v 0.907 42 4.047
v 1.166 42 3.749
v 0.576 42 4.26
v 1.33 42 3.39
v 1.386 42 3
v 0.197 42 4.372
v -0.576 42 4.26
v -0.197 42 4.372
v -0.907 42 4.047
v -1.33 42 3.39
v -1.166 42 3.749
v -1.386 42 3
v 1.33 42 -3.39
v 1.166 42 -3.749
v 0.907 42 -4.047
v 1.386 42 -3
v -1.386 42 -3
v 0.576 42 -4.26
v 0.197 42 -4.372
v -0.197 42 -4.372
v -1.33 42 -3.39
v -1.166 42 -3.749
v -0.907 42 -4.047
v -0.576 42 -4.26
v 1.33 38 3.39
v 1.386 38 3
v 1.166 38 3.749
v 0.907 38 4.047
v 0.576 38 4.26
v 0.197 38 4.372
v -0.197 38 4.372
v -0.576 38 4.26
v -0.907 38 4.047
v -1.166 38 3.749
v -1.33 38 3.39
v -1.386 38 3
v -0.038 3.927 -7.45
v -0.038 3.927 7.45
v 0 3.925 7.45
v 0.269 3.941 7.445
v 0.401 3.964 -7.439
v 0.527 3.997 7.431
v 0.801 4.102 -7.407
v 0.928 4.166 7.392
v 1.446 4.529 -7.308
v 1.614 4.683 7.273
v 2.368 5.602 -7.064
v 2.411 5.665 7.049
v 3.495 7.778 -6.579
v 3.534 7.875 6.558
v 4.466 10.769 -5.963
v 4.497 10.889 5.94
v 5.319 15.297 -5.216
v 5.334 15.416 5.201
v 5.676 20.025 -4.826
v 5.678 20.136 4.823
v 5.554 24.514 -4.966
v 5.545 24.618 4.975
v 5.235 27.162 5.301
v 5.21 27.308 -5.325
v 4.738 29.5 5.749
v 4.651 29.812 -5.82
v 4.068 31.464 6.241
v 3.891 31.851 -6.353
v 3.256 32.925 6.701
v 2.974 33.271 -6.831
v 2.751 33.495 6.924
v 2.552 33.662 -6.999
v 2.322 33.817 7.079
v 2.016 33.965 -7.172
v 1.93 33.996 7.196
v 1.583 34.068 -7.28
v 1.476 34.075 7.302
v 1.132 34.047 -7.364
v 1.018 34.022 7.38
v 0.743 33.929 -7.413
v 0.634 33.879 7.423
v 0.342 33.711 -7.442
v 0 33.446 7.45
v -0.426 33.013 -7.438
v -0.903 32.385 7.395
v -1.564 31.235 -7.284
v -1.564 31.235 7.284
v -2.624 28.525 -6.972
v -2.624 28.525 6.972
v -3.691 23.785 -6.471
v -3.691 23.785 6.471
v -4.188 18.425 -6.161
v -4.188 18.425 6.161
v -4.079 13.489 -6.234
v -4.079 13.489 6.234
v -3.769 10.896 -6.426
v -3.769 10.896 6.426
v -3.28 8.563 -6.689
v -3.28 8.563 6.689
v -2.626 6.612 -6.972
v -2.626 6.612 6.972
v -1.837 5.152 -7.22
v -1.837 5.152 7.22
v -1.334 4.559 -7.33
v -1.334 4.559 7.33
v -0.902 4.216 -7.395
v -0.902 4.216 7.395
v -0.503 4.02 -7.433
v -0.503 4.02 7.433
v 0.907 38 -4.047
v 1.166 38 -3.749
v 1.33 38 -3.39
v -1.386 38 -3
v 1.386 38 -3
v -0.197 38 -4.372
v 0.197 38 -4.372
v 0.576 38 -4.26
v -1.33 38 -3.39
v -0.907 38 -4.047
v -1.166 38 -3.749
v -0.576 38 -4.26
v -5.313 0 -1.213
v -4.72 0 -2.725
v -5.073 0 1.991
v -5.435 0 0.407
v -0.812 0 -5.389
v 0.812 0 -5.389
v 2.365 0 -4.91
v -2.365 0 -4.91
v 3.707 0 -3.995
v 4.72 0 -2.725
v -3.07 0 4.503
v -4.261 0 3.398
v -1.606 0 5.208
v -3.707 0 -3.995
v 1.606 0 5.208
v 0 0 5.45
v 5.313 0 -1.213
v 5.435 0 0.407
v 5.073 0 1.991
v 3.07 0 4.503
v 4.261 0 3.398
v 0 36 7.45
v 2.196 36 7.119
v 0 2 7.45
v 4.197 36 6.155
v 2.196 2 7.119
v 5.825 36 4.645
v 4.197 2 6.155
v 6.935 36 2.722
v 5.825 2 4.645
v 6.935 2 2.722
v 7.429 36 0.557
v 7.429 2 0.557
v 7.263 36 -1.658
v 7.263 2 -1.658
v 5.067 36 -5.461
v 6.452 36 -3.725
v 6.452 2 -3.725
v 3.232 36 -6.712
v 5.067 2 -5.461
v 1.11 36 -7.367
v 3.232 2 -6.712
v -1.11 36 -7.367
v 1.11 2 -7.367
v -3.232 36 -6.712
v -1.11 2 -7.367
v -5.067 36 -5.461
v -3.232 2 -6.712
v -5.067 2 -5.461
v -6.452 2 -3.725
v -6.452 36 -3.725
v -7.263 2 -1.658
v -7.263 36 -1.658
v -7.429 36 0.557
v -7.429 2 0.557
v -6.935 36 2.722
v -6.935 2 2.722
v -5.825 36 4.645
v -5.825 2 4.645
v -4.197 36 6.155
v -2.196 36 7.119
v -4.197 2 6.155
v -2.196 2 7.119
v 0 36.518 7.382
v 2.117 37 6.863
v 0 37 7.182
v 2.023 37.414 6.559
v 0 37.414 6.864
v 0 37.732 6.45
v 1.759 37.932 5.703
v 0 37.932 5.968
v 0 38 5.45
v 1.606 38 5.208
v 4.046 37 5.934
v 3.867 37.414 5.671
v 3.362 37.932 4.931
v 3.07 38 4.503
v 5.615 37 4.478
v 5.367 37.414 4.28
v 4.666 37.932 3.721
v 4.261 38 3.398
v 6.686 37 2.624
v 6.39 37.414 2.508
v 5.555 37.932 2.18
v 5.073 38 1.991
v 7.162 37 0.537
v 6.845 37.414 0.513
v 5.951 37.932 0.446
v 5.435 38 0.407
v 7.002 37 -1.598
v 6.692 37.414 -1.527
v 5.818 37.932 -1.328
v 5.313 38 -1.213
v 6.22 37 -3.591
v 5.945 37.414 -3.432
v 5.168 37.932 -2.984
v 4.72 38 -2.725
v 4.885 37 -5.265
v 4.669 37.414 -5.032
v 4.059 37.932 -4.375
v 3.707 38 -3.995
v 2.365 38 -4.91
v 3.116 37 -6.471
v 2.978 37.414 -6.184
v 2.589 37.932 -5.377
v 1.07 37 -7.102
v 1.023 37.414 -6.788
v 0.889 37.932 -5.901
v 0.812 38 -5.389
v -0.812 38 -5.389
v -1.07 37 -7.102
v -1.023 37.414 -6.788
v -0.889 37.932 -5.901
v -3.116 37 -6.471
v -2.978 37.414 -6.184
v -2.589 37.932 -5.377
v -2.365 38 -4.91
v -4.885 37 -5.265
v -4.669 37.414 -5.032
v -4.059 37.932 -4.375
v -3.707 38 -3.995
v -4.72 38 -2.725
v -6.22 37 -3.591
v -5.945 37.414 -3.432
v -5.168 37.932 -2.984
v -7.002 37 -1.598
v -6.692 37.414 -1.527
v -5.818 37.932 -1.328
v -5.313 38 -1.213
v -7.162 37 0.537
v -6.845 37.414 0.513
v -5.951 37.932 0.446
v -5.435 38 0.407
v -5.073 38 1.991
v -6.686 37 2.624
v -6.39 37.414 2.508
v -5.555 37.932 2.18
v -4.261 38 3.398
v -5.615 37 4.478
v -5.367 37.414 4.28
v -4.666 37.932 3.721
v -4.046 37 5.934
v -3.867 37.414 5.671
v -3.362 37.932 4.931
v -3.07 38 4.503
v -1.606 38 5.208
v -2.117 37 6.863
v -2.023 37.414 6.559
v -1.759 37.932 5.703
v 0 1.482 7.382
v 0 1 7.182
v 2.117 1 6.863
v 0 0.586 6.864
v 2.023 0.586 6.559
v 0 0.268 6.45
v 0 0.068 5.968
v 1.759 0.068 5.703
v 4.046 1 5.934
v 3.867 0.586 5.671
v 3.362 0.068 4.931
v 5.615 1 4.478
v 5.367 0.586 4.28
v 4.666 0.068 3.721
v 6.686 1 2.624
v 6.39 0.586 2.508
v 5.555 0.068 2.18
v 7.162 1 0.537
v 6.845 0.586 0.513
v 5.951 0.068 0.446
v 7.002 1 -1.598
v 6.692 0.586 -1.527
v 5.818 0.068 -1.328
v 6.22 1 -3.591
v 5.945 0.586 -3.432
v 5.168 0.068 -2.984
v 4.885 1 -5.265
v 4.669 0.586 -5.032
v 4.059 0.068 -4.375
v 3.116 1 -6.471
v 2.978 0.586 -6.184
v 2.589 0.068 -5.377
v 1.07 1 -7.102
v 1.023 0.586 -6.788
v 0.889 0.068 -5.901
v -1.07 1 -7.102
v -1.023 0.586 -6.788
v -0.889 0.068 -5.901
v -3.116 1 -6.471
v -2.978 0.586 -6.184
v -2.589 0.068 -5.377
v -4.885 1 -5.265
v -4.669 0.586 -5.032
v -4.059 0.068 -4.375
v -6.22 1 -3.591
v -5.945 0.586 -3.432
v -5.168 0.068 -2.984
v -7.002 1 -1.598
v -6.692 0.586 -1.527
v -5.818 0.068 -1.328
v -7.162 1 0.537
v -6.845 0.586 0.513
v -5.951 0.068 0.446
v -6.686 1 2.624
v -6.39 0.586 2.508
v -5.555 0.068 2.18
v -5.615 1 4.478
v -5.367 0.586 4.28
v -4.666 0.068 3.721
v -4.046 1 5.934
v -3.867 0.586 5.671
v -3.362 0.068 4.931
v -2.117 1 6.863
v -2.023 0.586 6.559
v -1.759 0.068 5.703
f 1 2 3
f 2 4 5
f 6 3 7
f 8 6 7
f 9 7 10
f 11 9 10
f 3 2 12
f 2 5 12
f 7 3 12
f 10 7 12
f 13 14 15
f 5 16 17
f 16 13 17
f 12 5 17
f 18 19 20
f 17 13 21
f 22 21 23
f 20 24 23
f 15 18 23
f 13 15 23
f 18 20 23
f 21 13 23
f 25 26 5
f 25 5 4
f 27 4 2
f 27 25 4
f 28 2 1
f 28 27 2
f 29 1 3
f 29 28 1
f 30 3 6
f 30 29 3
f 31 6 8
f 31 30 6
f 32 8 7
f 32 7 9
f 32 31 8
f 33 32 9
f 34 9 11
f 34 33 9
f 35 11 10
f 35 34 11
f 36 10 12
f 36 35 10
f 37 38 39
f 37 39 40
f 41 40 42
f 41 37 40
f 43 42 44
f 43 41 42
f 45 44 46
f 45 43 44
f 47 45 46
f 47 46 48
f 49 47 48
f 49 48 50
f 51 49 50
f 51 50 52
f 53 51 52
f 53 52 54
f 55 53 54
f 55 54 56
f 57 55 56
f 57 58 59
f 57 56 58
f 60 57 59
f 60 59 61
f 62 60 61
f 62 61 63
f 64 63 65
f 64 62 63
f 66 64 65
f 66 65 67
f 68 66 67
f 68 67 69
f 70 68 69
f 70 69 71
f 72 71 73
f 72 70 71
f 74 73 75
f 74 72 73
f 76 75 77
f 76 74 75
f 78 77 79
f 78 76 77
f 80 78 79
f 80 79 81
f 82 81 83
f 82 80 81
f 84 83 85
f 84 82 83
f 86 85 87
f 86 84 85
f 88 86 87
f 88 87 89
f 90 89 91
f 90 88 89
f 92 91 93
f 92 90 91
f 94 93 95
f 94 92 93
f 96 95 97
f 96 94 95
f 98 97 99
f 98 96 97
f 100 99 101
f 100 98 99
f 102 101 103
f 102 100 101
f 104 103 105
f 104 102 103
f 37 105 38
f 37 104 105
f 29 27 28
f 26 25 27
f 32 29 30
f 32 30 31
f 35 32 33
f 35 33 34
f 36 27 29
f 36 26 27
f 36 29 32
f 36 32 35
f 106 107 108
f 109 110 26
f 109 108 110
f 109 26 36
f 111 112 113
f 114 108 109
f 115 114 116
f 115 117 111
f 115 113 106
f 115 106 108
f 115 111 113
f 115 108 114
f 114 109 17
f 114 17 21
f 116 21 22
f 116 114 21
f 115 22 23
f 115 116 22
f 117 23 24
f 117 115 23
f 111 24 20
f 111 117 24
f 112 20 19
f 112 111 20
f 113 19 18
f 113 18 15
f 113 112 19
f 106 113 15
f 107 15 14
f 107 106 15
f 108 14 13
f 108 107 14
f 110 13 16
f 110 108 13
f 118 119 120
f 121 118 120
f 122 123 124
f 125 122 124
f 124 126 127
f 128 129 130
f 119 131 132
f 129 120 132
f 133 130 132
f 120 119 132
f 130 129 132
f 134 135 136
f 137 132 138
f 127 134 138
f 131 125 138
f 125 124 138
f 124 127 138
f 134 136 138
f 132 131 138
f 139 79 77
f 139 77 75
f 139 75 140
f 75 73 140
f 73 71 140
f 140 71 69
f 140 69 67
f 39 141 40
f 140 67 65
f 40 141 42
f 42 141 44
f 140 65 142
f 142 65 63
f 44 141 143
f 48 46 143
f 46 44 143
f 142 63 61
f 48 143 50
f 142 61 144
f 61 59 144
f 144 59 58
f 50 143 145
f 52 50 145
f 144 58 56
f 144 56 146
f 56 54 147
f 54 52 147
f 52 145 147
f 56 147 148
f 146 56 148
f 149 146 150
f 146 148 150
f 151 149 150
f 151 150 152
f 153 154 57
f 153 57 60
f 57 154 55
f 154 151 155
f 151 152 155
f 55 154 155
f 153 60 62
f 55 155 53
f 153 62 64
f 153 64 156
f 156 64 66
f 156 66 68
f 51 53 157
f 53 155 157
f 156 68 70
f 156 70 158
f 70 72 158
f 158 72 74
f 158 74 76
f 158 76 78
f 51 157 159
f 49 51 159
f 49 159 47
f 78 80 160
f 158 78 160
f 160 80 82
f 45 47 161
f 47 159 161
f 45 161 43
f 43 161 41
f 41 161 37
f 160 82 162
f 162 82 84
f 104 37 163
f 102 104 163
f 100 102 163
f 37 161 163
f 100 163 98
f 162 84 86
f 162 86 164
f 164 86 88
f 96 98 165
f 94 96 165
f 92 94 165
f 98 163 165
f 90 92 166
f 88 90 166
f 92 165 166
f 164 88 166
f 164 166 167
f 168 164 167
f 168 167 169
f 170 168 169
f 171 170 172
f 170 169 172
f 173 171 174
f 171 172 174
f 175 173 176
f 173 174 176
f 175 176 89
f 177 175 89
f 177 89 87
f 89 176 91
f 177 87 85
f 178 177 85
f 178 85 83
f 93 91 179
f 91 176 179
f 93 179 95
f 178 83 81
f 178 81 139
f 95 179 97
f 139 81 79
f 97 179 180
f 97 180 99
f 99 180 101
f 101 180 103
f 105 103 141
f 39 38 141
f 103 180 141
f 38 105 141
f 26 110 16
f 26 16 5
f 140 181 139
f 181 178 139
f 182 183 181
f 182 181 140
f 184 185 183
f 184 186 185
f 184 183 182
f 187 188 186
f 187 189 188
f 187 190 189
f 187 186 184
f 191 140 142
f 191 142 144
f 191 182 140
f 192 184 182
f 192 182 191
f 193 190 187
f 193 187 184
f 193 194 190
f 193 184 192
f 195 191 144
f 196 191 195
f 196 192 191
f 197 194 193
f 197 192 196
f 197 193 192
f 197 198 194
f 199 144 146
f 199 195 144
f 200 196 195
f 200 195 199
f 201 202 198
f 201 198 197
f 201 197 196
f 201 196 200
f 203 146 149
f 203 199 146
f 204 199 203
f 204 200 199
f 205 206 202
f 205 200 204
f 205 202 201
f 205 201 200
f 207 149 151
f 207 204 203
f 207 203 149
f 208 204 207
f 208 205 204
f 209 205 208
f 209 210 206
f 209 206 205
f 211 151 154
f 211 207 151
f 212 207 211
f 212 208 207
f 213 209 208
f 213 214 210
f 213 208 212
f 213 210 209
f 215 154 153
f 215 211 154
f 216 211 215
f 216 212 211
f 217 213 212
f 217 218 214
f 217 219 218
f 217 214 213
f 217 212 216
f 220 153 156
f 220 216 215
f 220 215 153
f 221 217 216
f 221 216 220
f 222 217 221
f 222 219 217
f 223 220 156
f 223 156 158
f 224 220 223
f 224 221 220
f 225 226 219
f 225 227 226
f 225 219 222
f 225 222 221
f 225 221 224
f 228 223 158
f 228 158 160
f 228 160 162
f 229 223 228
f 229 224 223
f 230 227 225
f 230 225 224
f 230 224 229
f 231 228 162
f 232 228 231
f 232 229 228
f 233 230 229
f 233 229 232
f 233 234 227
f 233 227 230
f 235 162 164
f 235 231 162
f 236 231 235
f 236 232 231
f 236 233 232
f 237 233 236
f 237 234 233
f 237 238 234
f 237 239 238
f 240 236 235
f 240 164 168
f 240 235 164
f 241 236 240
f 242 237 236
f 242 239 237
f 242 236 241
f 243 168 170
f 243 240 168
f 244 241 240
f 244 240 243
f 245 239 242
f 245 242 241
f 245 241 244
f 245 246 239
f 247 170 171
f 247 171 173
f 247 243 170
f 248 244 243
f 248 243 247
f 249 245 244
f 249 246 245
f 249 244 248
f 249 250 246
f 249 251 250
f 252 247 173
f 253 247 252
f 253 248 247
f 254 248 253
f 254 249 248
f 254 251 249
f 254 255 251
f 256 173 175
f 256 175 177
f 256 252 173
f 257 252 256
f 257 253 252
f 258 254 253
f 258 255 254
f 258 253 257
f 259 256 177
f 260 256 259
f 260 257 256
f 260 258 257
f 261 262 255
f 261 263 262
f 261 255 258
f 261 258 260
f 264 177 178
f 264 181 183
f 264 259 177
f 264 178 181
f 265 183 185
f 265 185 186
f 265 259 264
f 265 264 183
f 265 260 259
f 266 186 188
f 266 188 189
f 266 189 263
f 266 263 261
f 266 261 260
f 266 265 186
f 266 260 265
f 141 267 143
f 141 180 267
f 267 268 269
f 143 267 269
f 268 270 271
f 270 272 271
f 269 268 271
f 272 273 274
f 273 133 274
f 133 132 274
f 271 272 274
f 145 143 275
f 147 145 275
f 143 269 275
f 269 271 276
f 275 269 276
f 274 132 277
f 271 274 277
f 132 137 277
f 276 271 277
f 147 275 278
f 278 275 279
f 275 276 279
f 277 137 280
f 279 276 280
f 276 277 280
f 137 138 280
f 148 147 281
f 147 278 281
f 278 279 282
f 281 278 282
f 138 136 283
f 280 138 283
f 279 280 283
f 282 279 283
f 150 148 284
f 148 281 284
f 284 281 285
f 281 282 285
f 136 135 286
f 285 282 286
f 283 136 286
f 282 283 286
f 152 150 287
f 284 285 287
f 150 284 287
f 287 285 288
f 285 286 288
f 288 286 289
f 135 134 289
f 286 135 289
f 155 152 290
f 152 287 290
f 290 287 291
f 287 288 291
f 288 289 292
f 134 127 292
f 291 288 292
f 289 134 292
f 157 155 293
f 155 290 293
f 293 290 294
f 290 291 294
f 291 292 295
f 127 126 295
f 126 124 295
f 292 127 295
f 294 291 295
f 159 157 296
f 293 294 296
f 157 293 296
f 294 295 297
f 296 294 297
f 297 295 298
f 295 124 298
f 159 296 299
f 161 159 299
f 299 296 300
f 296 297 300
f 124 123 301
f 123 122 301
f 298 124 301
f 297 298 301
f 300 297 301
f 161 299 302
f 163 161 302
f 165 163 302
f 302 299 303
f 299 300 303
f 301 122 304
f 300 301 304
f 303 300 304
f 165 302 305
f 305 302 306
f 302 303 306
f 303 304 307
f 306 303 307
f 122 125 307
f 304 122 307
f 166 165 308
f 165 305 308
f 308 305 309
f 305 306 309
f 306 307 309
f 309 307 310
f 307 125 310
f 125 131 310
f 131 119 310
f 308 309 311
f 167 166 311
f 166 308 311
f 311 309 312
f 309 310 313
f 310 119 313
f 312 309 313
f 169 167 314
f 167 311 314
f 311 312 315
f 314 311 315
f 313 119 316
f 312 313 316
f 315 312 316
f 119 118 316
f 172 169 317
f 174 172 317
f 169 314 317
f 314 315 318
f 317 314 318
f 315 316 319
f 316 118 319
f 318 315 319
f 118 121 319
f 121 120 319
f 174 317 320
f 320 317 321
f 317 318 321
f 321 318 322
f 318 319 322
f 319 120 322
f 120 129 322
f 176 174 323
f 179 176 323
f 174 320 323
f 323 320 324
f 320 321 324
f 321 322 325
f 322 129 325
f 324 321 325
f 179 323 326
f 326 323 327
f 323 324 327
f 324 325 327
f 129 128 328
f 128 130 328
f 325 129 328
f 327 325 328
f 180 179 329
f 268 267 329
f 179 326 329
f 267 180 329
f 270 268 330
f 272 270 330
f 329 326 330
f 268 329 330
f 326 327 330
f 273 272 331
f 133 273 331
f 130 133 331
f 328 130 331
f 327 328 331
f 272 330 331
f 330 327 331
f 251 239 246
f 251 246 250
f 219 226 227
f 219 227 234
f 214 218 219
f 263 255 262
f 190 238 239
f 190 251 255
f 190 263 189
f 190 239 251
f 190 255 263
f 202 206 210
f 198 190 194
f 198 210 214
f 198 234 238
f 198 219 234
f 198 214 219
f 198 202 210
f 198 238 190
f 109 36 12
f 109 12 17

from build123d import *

# Parameters (mm, degrees)
SKETCH_1_R               = 7.45
EXTRUDE_1_DEPTH          = 38
FILLET_1_R               = 2
CUT_EXTRUDE_1_DEPTH      = 40.433551723
CUT_EXTRUDE_1_DEPTH_BACK = 40.433551723
SKETCH_2_RX              = 15.093010042
SKETCH_2_RY              = 4.896660512
EXTRUDE_1_2_DEPTH        = 4


with BuildPart() as part:
    # Эскиз1 → Extrude 1 (new body)
    with BuildSketch(Plane(origin=(0, 0, 0), x_dir=(1, 0, 0), z_dir=(0, 1, 0))):
        with Locations(Location((0, 0, 0), (0, 0, 270))):
            Circle(SKETCH_1_R)
    extrude(amount=EXTRUDE_1_DEPTH)

    # Скругление1
    fillet_1_edges = [part.edges().sort_by_distance(p)[0] for p in [
        (0, 0, -7.45),
        (0, 38, -7.45),
    ]]
    fillet(fillet_1_edges, radius=FILLET_1_R)

    # Эскиз2 → Вырез-Вытянуть1 (cut, two sides: drawn at the far end of the back side and taken through both)
    with BuildSketch(Plane.XY.offset(-CUT_EXTRUDE_1_DEPTH_BACK)):
        with Locations(Location((0.737430759, 19), (0, 0, -92.943333717))):
            Ellipse(SKETCH_2_RX, SKETCH_2_RY)
    extrude(amount=CUT_EXTRUDE_1_DEPTH + CUT_EXTRUDE_1_DEPTH_BACK, mode=Mode.SUBTRACT)


with BuildPart() as body_2:
    # Эскиз3 → Extrude 1 2 (new body)
    with BuildSketch(Plane(origin=(0, 38, 0), x_dir=(1, 0, 0), z_dir=(0, 1, 0))):
        with BuildLine():
            Line((1.385702183, 3), (1.385702183, -3))
            ThreePointArc((1.385702183, -3), (0, -4.385702183), (-1.385702183, -3))
            Line((-1.385702183, -3), (-1.385702183, 3))
            ThreePointArc((-1.385702183, 3), (0, 4.385702183), (1.385702183, 3))
        make_face()
    extrude(amount=EXTRUDE_1_2_DEPTH)


solid = Compound([part.part, body_2.part])
